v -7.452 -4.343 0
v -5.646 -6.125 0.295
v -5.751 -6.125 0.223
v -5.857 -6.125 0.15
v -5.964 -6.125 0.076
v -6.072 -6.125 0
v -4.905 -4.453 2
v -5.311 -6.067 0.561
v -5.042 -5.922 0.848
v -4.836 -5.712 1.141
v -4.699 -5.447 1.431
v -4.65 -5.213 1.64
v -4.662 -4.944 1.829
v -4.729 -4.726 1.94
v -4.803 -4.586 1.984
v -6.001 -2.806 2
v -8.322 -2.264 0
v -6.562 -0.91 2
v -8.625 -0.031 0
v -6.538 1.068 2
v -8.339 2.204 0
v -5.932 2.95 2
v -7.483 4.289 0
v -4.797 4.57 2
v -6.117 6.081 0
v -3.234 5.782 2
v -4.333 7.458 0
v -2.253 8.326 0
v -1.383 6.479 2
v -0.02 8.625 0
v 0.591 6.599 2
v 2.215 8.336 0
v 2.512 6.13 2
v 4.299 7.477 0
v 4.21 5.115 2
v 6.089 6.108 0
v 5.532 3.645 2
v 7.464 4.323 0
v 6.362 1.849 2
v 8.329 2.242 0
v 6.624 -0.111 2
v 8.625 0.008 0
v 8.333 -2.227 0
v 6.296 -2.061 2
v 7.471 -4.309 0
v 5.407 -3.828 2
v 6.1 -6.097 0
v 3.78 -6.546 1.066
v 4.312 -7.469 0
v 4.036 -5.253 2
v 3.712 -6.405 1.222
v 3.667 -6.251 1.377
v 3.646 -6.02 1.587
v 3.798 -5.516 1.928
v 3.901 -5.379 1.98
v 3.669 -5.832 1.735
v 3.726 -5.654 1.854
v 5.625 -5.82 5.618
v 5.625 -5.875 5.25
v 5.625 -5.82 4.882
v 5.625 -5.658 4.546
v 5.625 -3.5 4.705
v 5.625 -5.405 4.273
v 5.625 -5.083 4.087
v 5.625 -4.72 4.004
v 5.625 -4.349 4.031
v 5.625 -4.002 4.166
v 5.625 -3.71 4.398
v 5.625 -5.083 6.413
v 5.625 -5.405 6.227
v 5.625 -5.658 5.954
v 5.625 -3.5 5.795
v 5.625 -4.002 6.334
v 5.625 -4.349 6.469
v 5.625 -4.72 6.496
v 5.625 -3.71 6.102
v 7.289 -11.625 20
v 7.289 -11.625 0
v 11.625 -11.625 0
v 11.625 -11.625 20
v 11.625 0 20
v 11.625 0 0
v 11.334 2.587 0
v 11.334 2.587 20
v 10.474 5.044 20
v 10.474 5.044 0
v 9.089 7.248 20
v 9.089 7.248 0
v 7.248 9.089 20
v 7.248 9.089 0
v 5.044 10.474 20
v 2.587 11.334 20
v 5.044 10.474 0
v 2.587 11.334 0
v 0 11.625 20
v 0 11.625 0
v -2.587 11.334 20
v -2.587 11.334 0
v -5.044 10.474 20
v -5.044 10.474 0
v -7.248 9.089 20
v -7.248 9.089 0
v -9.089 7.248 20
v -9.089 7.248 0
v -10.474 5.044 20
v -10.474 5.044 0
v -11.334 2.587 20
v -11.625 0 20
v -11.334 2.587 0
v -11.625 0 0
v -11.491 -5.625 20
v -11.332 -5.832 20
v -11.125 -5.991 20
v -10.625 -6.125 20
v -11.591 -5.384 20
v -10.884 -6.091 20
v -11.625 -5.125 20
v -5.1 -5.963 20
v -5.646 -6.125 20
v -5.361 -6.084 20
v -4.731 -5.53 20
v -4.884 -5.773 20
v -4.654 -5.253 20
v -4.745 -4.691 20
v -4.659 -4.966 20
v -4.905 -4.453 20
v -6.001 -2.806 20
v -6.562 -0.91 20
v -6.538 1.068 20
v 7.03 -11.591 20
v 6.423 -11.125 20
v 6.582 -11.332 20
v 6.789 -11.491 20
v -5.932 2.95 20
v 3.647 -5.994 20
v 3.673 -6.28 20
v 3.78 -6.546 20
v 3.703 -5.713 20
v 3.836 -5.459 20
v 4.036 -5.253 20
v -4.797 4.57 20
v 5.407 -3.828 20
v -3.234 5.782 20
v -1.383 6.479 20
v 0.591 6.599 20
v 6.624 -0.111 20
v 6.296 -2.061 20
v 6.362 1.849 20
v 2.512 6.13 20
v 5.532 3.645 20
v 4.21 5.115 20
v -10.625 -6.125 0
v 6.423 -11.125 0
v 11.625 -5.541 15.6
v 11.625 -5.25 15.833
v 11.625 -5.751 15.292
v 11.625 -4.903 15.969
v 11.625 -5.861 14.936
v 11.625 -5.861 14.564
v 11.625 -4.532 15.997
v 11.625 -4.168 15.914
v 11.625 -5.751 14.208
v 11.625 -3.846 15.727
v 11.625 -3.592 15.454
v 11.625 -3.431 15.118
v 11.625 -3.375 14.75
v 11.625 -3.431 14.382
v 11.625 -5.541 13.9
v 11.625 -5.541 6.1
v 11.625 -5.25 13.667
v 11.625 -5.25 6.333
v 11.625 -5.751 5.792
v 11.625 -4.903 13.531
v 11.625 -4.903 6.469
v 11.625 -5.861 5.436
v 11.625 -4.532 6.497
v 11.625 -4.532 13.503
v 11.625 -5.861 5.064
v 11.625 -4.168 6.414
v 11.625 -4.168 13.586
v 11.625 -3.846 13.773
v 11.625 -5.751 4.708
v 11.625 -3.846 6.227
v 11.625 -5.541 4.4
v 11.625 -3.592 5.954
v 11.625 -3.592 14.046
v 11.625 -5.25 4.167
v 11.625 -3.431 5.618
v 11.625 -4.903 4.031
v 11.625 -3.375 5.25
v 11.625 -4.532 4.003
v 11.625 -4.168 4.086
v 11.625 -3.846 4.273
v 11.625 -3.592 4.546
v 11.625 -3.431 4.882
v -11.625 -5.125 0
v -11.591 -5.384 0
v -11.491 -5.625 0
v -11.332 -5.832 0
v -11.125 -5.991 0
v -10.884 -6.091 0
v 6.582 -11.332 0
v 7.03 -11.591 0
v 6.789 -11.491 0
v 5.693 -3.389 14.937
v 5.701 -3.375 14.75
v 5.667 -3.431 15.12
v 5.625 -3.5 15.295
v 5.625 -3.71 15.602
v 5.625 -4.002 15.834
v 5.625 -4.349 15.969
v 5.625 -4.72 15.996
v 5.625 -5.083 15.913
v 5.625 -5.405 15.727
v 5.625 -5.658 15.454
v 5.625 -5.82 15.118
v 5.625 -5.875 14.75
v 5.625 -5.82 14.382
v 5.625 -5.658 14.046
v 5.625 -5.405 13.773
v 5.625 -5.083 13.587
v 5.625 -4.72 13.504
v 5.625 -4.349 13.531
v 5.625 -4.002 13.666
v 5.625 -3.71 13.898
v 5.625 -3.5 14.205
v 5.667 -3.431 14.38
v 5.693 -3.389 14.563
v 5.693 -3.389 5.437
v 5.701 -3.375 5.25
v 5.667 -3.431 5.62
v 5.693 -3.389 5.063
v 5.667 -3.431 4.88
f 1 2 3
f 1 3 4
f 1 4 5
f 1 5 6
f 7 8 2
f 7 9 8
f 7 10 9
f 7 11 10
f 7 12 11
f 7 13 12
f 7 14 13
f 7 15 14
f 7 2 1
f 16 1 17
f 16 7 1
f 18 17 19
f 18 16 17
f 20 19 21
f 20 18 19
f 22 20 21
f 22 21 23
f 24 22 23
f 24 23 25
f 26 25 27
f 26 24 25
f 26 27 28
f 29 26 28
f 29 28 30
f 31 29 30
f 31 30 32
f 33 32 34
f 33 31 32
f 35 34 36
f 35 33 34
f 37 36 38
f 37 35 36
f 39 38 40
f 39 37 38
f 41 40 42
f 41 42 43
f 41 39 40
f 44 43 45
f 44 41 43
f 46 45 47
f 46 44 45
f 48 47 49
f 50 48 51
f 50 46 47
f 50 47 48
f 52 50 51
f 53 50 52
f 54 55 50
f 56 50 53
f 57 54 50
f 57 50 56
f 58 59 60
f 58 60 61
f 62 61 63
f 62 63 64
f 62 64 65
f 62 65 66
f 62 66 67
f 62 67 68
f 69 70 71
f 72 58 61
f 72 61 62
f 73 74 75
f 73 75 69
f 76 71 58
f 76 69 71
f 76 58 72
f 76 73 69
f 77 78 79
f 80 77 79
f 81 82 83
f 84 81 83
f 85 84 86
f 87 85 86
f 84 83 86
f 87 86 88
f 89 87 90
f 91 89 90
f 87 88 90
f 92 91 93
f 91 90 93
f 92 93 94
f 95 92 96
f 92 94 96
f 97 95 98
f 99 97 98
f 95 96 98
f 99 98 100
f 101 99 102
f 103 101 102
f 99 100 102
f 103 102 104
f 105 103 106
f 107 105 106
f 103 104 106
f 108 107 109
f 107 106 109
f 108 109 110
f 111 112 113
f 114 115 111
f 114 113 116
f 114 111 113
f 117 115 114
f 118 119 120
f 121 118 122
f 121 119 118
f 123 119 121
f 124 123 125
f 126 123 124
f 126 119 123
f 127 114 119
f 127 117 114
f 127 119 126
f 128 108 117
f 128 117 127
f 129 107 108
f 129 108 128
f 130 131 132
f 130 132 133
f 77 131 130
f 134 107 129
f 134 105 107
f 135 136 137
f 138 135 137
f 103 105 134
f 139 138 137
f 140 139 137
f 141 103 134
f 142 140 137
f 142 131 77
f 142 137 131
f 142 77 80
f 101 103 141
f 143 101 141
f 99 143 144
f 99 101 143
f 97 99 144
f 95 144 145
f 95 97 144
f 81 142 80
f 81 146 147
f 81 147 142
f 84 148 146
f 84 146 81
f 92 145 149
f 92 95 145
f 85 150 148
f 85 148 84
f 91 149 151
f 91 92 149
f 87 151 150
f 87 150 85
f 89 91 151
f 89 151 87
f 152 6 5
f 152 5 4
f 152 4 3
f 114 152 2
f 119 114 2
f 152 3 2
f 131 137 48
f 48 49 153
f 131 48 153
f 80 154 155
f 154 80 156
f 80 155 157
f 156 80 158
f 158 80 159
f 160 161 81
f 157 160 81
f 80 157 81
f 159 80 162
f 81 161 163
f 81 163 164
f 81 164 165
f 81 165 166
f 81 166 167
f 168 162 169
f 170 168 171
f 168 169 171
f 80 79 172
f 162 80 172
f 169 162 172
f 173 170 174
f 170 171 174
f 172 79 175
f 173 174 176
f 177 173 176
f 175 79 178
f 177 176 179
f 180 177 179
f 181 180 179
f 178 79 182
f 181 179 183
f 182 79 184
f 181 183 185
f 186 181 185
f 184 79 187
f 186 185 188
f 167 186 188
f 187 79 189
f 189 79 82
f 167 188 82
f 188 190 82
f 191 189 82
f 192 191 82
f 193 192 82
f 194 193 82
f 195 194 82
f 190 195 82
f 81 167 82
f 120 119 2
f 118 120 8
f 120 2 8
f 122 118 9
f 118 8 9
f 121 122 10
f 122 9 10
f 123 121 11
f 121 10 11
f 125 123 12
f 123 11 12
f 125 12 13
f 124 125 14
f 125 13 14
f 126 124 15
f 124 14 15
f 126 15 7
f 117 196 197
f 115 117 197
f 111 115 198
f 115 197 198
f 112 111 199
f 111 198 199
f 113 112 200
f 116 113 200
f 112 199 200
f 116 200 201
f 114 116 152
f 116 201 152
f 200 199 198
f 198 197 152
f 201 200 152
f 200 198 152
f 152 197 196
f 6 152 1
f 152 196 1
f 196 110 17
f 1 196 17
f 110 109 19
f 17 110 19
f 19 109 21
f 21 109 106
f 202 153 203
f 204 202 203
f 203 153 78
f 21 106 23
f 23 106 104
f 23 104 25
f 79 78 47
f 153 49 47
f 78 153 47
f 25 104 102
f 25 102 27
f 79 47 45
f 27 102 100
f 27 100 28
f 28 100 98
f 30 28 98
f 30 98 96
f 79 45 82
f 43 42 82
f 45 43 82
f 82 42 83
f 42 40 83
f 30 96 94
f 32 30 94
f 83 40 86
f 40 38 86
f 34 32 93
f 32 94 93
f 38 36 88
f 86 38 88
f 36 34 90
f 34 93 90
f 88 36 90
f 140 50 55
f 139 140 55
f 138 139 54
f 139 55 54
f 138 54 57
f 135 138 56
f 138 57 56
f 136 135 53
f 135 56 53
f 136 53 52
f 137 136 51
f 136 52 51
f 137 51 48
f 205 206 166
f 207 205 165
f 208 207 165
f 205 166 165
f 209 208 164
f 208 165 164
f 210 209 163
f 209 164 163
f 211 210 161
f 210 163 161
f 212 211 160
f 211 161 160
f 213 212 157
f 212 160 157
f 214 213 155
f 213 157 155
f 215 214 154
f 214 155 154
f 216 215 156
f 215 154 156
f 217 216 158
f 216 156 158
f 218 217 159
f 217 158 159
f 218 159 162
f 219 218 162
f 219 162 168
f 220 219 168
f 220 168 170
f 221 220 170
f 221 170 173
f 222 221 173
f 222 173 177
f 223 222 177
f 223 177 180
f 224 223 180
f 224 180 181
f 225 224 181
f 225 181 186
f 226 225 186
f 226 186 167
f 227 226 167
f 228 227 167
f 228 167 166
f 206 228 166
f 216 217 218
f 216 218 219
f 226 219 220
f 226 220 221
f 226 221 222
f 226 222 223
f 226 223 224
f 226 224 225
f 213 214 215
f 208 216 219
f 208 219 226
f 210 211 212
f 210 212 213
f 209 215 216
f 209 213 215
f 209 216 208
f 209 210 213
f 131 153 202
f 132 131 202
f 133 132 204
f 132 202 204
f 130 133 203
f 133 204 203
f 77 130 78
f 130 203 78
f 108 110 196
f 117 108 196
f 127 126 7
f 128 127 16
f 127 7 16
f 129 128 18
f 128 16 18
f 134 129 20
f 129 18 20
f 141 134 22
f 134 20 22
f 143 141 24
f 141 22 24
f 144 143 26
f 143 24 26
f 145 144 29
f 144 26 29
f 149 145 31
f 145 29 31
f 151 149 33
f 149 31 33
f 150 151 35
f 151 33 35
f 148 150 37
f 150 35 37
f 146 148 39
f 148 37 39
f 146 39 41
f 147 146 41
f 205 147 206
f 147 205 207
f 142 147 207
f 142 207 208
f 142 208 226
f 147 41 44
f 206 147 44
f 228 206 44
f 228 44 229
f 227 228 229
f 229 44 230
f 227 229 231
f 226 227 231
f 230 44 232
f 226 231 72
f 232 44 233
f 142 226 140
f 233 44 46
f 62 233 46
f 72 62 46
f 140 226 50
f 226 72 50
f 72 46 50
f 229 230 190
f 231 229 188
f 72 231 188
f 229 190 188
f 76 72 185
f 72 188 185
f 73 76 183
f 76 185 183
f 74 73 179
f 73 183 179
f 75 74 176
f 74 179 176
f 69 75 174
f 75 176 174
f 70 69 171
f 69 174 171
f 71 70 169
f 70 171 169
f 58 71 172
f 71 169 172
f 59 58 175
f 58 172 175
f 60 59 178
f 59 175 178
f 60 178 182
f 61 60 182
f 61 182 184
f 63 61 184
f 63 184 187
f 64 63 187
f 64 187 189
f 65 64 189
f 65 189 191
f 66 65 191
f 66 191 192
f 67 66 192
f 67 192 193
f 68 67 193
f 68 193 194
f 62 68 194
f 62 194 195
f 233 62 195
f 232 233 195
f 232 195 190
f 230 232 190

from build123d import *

# Parameters (mm, degrees)
F1_DEPTH    = 20
F2_R        = 1.25
F3_DEPTH    = 6
F4_T2_ANGLE = 359.64


# Not quite as in the source:
# - a fillet or chamfer that OpenCascade refuses, or shapes differently, is made with other operations: its cross-section is extruded or revolved along the edge and cut away or added
# - a feature names something its author has since deleted; it is built from what else it names


with BuildPart() as f1:
    # F0 (on Top) → F1 (new body)
    with BuildSketch(Plane.XY):
        with BuildLine():
            Line((11.625, -11.625), (11.625, 0))
            ThreePointArc((11.625, 0), (0, 11.625), (-11.625, 0))
            Line((-11.625, 0), (-11.625, -5.125))
            ThreePointArc((-11.625, -5.125), (-11.3321067812, -5.8321067812), (-10.625, -6.125))
            Line((-10.625, -6.125), (-5.6457948953, -6.125))
            ThreePointArc((-5.6457948953, -6.125), (-4.7314286811, -5.5298881651), (-4.9053627779, -4.4528688525))
            ThreePointArc((-4.9053627779, -4.4528688525), (0.5907863647, 6.598605646), (4.0363377793, -5.2534371921))
            ThreePointArc((4.0363377793, -5.2534371921), (3.6647499446, -5.8516258782), (3.7795709082, -6.5464088438))
            Line((3.7795709082, -6.5464088438), (6.4230217447, -11.125))
            ThreePointArc((6.4230217447, -11.125), (6.7890471485, -11.4910254038), (7.2890471485, -11.625))
            Line((7.2890471485, -11.625), (11.625, -11.625))
        make_face()
    extrude(amount=F1_DEPTH)

    # F2 (on face) → F3 (cut)
    with BuildSketch(Plane.YZ.offset(11.625)):
        with Locations((-4.625, 14.75)):
            Circle(F2_R)
        with Locations((-4.625, 5.25)):
            Circle(F2_R)
    extrude(amount=-F3_DEPTH, mode=Mode.SUBTRACT)

    # F4: chamfer of 2 on 1 edges, made by hand

    # F4_s1 → F4_t2 (revolve, cut)
    with BuildSketch(Plane(origin=(0, 0, 0), x_dir=(0, 0, 1), z_dir=(0.9957308794, -0.0923039315, 0))):
        Polygon((0, 8.625), (2, 6.625), (0, 6.625), align=None)
    revolve(axis=Axis((0, 0, 0), (0, 0, -1)), revolution_arc=F4_T2_ANGLE, mode=Mode.SUBTRACT)


solid = f1.part
